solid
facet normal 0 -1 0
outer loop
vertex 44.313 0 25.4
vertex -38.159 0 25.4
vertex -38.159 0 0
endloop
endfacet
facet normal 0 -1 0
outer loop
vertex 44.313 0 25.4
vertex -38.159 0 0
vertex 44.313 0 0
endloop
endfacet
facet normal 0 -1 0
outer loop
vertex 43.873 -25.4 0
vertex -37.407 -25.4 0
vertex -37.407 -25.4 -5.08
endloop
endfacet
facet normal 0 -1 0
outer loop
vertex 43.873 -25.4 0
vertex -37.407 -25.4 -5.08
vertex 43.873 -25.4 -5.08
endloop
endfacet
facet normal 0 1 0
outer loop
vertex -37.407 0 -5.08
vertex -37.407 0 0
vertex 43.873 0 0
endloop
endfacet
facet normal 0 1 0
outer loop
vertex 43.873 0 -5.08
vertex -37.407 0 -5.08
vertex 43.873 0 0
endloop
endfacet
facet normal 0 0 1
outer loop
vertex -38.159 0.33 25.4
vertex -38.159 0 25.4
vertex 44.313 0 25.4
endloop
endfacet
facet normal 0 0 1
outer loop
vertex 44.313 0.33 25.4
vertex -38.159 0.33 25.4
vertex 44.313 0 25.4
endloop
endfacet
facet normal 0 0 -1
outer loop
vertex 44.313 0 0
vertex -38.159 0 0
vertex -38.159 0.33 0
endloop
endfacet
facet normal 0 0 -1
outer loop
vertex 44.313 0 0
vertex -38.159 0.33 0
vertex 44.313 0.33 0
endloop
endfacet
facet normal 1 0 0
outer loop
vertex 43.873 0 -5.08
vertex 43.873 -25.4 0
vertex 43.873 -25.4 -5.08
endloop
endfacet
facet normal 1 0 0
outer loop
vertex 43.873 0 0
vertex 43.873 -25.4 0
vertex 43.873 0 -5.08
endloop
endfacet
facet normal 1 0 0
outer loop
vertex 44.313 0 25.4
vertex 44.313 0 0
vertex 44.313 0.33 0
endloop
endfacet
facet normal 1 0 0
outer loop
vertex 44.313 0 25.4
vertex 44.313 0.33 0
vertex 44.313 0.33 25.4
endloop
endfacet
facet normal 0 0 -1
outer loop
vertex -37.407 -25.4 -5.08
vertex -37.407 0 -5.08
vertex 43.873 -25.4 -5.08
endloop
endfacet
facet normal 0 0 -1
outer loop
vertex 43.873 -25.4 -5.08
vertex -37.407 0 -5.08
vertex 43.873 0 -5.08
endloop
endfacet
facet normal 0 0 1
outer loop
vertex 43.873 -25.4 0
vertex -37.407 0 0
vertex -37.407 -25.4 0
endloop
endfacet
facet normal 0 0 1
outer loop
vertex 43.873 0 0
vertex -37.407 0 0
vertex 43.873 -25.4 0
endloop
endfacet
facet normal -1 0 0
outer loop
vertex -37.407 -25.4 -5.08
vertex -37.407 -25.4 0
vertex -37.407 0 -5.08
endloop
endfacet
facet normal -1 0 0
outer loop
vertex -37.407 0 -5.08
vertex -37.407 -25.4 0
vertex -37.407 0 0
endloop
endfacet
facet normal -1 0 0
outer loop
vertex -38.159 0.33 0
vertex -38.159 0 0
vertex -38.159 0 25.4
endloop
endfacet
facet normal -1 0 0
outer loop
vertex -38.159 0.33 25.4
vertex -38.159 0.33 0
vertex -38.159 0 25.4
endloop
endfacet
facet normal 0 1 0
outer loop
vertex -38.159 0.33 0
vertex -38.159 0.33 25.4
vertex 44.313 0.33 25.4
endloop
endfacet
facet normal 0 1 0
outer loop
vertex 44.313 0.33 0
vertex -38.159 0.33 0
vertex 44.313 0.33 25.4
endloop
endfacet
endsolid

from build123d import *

# Parameters (mm, degrees)
F0_W     = 82.4718438089
F0_H     = 25.4
F1_DEPTH = 0.3302
F4_W     = 81.28
F4_H     = 25.4
F5_DEPTH = 5.08


# Not quite as in the source:
# - the program builds the solid bodies; features that only make, move or delete a surface that nothing else refers to are left out


with BuildPart() as f1:
    # F0 (on Front) → F1 (new body)
    with BuildSketch(Plane.XZ):
        with Locations((3.077307716, 12.7)):
            Rectangle(F0_W, F0_H)
    extrude(amount=-F1_DEPTH)


with BuildPart() as f5:
    # F4 (on Top) → F5 (new body)
    with BuildSketch(Plane.XY):
        with Locations((3.2327694142, -12.7)):
            Rectangle(F4_W, F4_H)
    extrude(amount=-F5_DEPTH)


solid = Compound([f1.part, f5.part])
